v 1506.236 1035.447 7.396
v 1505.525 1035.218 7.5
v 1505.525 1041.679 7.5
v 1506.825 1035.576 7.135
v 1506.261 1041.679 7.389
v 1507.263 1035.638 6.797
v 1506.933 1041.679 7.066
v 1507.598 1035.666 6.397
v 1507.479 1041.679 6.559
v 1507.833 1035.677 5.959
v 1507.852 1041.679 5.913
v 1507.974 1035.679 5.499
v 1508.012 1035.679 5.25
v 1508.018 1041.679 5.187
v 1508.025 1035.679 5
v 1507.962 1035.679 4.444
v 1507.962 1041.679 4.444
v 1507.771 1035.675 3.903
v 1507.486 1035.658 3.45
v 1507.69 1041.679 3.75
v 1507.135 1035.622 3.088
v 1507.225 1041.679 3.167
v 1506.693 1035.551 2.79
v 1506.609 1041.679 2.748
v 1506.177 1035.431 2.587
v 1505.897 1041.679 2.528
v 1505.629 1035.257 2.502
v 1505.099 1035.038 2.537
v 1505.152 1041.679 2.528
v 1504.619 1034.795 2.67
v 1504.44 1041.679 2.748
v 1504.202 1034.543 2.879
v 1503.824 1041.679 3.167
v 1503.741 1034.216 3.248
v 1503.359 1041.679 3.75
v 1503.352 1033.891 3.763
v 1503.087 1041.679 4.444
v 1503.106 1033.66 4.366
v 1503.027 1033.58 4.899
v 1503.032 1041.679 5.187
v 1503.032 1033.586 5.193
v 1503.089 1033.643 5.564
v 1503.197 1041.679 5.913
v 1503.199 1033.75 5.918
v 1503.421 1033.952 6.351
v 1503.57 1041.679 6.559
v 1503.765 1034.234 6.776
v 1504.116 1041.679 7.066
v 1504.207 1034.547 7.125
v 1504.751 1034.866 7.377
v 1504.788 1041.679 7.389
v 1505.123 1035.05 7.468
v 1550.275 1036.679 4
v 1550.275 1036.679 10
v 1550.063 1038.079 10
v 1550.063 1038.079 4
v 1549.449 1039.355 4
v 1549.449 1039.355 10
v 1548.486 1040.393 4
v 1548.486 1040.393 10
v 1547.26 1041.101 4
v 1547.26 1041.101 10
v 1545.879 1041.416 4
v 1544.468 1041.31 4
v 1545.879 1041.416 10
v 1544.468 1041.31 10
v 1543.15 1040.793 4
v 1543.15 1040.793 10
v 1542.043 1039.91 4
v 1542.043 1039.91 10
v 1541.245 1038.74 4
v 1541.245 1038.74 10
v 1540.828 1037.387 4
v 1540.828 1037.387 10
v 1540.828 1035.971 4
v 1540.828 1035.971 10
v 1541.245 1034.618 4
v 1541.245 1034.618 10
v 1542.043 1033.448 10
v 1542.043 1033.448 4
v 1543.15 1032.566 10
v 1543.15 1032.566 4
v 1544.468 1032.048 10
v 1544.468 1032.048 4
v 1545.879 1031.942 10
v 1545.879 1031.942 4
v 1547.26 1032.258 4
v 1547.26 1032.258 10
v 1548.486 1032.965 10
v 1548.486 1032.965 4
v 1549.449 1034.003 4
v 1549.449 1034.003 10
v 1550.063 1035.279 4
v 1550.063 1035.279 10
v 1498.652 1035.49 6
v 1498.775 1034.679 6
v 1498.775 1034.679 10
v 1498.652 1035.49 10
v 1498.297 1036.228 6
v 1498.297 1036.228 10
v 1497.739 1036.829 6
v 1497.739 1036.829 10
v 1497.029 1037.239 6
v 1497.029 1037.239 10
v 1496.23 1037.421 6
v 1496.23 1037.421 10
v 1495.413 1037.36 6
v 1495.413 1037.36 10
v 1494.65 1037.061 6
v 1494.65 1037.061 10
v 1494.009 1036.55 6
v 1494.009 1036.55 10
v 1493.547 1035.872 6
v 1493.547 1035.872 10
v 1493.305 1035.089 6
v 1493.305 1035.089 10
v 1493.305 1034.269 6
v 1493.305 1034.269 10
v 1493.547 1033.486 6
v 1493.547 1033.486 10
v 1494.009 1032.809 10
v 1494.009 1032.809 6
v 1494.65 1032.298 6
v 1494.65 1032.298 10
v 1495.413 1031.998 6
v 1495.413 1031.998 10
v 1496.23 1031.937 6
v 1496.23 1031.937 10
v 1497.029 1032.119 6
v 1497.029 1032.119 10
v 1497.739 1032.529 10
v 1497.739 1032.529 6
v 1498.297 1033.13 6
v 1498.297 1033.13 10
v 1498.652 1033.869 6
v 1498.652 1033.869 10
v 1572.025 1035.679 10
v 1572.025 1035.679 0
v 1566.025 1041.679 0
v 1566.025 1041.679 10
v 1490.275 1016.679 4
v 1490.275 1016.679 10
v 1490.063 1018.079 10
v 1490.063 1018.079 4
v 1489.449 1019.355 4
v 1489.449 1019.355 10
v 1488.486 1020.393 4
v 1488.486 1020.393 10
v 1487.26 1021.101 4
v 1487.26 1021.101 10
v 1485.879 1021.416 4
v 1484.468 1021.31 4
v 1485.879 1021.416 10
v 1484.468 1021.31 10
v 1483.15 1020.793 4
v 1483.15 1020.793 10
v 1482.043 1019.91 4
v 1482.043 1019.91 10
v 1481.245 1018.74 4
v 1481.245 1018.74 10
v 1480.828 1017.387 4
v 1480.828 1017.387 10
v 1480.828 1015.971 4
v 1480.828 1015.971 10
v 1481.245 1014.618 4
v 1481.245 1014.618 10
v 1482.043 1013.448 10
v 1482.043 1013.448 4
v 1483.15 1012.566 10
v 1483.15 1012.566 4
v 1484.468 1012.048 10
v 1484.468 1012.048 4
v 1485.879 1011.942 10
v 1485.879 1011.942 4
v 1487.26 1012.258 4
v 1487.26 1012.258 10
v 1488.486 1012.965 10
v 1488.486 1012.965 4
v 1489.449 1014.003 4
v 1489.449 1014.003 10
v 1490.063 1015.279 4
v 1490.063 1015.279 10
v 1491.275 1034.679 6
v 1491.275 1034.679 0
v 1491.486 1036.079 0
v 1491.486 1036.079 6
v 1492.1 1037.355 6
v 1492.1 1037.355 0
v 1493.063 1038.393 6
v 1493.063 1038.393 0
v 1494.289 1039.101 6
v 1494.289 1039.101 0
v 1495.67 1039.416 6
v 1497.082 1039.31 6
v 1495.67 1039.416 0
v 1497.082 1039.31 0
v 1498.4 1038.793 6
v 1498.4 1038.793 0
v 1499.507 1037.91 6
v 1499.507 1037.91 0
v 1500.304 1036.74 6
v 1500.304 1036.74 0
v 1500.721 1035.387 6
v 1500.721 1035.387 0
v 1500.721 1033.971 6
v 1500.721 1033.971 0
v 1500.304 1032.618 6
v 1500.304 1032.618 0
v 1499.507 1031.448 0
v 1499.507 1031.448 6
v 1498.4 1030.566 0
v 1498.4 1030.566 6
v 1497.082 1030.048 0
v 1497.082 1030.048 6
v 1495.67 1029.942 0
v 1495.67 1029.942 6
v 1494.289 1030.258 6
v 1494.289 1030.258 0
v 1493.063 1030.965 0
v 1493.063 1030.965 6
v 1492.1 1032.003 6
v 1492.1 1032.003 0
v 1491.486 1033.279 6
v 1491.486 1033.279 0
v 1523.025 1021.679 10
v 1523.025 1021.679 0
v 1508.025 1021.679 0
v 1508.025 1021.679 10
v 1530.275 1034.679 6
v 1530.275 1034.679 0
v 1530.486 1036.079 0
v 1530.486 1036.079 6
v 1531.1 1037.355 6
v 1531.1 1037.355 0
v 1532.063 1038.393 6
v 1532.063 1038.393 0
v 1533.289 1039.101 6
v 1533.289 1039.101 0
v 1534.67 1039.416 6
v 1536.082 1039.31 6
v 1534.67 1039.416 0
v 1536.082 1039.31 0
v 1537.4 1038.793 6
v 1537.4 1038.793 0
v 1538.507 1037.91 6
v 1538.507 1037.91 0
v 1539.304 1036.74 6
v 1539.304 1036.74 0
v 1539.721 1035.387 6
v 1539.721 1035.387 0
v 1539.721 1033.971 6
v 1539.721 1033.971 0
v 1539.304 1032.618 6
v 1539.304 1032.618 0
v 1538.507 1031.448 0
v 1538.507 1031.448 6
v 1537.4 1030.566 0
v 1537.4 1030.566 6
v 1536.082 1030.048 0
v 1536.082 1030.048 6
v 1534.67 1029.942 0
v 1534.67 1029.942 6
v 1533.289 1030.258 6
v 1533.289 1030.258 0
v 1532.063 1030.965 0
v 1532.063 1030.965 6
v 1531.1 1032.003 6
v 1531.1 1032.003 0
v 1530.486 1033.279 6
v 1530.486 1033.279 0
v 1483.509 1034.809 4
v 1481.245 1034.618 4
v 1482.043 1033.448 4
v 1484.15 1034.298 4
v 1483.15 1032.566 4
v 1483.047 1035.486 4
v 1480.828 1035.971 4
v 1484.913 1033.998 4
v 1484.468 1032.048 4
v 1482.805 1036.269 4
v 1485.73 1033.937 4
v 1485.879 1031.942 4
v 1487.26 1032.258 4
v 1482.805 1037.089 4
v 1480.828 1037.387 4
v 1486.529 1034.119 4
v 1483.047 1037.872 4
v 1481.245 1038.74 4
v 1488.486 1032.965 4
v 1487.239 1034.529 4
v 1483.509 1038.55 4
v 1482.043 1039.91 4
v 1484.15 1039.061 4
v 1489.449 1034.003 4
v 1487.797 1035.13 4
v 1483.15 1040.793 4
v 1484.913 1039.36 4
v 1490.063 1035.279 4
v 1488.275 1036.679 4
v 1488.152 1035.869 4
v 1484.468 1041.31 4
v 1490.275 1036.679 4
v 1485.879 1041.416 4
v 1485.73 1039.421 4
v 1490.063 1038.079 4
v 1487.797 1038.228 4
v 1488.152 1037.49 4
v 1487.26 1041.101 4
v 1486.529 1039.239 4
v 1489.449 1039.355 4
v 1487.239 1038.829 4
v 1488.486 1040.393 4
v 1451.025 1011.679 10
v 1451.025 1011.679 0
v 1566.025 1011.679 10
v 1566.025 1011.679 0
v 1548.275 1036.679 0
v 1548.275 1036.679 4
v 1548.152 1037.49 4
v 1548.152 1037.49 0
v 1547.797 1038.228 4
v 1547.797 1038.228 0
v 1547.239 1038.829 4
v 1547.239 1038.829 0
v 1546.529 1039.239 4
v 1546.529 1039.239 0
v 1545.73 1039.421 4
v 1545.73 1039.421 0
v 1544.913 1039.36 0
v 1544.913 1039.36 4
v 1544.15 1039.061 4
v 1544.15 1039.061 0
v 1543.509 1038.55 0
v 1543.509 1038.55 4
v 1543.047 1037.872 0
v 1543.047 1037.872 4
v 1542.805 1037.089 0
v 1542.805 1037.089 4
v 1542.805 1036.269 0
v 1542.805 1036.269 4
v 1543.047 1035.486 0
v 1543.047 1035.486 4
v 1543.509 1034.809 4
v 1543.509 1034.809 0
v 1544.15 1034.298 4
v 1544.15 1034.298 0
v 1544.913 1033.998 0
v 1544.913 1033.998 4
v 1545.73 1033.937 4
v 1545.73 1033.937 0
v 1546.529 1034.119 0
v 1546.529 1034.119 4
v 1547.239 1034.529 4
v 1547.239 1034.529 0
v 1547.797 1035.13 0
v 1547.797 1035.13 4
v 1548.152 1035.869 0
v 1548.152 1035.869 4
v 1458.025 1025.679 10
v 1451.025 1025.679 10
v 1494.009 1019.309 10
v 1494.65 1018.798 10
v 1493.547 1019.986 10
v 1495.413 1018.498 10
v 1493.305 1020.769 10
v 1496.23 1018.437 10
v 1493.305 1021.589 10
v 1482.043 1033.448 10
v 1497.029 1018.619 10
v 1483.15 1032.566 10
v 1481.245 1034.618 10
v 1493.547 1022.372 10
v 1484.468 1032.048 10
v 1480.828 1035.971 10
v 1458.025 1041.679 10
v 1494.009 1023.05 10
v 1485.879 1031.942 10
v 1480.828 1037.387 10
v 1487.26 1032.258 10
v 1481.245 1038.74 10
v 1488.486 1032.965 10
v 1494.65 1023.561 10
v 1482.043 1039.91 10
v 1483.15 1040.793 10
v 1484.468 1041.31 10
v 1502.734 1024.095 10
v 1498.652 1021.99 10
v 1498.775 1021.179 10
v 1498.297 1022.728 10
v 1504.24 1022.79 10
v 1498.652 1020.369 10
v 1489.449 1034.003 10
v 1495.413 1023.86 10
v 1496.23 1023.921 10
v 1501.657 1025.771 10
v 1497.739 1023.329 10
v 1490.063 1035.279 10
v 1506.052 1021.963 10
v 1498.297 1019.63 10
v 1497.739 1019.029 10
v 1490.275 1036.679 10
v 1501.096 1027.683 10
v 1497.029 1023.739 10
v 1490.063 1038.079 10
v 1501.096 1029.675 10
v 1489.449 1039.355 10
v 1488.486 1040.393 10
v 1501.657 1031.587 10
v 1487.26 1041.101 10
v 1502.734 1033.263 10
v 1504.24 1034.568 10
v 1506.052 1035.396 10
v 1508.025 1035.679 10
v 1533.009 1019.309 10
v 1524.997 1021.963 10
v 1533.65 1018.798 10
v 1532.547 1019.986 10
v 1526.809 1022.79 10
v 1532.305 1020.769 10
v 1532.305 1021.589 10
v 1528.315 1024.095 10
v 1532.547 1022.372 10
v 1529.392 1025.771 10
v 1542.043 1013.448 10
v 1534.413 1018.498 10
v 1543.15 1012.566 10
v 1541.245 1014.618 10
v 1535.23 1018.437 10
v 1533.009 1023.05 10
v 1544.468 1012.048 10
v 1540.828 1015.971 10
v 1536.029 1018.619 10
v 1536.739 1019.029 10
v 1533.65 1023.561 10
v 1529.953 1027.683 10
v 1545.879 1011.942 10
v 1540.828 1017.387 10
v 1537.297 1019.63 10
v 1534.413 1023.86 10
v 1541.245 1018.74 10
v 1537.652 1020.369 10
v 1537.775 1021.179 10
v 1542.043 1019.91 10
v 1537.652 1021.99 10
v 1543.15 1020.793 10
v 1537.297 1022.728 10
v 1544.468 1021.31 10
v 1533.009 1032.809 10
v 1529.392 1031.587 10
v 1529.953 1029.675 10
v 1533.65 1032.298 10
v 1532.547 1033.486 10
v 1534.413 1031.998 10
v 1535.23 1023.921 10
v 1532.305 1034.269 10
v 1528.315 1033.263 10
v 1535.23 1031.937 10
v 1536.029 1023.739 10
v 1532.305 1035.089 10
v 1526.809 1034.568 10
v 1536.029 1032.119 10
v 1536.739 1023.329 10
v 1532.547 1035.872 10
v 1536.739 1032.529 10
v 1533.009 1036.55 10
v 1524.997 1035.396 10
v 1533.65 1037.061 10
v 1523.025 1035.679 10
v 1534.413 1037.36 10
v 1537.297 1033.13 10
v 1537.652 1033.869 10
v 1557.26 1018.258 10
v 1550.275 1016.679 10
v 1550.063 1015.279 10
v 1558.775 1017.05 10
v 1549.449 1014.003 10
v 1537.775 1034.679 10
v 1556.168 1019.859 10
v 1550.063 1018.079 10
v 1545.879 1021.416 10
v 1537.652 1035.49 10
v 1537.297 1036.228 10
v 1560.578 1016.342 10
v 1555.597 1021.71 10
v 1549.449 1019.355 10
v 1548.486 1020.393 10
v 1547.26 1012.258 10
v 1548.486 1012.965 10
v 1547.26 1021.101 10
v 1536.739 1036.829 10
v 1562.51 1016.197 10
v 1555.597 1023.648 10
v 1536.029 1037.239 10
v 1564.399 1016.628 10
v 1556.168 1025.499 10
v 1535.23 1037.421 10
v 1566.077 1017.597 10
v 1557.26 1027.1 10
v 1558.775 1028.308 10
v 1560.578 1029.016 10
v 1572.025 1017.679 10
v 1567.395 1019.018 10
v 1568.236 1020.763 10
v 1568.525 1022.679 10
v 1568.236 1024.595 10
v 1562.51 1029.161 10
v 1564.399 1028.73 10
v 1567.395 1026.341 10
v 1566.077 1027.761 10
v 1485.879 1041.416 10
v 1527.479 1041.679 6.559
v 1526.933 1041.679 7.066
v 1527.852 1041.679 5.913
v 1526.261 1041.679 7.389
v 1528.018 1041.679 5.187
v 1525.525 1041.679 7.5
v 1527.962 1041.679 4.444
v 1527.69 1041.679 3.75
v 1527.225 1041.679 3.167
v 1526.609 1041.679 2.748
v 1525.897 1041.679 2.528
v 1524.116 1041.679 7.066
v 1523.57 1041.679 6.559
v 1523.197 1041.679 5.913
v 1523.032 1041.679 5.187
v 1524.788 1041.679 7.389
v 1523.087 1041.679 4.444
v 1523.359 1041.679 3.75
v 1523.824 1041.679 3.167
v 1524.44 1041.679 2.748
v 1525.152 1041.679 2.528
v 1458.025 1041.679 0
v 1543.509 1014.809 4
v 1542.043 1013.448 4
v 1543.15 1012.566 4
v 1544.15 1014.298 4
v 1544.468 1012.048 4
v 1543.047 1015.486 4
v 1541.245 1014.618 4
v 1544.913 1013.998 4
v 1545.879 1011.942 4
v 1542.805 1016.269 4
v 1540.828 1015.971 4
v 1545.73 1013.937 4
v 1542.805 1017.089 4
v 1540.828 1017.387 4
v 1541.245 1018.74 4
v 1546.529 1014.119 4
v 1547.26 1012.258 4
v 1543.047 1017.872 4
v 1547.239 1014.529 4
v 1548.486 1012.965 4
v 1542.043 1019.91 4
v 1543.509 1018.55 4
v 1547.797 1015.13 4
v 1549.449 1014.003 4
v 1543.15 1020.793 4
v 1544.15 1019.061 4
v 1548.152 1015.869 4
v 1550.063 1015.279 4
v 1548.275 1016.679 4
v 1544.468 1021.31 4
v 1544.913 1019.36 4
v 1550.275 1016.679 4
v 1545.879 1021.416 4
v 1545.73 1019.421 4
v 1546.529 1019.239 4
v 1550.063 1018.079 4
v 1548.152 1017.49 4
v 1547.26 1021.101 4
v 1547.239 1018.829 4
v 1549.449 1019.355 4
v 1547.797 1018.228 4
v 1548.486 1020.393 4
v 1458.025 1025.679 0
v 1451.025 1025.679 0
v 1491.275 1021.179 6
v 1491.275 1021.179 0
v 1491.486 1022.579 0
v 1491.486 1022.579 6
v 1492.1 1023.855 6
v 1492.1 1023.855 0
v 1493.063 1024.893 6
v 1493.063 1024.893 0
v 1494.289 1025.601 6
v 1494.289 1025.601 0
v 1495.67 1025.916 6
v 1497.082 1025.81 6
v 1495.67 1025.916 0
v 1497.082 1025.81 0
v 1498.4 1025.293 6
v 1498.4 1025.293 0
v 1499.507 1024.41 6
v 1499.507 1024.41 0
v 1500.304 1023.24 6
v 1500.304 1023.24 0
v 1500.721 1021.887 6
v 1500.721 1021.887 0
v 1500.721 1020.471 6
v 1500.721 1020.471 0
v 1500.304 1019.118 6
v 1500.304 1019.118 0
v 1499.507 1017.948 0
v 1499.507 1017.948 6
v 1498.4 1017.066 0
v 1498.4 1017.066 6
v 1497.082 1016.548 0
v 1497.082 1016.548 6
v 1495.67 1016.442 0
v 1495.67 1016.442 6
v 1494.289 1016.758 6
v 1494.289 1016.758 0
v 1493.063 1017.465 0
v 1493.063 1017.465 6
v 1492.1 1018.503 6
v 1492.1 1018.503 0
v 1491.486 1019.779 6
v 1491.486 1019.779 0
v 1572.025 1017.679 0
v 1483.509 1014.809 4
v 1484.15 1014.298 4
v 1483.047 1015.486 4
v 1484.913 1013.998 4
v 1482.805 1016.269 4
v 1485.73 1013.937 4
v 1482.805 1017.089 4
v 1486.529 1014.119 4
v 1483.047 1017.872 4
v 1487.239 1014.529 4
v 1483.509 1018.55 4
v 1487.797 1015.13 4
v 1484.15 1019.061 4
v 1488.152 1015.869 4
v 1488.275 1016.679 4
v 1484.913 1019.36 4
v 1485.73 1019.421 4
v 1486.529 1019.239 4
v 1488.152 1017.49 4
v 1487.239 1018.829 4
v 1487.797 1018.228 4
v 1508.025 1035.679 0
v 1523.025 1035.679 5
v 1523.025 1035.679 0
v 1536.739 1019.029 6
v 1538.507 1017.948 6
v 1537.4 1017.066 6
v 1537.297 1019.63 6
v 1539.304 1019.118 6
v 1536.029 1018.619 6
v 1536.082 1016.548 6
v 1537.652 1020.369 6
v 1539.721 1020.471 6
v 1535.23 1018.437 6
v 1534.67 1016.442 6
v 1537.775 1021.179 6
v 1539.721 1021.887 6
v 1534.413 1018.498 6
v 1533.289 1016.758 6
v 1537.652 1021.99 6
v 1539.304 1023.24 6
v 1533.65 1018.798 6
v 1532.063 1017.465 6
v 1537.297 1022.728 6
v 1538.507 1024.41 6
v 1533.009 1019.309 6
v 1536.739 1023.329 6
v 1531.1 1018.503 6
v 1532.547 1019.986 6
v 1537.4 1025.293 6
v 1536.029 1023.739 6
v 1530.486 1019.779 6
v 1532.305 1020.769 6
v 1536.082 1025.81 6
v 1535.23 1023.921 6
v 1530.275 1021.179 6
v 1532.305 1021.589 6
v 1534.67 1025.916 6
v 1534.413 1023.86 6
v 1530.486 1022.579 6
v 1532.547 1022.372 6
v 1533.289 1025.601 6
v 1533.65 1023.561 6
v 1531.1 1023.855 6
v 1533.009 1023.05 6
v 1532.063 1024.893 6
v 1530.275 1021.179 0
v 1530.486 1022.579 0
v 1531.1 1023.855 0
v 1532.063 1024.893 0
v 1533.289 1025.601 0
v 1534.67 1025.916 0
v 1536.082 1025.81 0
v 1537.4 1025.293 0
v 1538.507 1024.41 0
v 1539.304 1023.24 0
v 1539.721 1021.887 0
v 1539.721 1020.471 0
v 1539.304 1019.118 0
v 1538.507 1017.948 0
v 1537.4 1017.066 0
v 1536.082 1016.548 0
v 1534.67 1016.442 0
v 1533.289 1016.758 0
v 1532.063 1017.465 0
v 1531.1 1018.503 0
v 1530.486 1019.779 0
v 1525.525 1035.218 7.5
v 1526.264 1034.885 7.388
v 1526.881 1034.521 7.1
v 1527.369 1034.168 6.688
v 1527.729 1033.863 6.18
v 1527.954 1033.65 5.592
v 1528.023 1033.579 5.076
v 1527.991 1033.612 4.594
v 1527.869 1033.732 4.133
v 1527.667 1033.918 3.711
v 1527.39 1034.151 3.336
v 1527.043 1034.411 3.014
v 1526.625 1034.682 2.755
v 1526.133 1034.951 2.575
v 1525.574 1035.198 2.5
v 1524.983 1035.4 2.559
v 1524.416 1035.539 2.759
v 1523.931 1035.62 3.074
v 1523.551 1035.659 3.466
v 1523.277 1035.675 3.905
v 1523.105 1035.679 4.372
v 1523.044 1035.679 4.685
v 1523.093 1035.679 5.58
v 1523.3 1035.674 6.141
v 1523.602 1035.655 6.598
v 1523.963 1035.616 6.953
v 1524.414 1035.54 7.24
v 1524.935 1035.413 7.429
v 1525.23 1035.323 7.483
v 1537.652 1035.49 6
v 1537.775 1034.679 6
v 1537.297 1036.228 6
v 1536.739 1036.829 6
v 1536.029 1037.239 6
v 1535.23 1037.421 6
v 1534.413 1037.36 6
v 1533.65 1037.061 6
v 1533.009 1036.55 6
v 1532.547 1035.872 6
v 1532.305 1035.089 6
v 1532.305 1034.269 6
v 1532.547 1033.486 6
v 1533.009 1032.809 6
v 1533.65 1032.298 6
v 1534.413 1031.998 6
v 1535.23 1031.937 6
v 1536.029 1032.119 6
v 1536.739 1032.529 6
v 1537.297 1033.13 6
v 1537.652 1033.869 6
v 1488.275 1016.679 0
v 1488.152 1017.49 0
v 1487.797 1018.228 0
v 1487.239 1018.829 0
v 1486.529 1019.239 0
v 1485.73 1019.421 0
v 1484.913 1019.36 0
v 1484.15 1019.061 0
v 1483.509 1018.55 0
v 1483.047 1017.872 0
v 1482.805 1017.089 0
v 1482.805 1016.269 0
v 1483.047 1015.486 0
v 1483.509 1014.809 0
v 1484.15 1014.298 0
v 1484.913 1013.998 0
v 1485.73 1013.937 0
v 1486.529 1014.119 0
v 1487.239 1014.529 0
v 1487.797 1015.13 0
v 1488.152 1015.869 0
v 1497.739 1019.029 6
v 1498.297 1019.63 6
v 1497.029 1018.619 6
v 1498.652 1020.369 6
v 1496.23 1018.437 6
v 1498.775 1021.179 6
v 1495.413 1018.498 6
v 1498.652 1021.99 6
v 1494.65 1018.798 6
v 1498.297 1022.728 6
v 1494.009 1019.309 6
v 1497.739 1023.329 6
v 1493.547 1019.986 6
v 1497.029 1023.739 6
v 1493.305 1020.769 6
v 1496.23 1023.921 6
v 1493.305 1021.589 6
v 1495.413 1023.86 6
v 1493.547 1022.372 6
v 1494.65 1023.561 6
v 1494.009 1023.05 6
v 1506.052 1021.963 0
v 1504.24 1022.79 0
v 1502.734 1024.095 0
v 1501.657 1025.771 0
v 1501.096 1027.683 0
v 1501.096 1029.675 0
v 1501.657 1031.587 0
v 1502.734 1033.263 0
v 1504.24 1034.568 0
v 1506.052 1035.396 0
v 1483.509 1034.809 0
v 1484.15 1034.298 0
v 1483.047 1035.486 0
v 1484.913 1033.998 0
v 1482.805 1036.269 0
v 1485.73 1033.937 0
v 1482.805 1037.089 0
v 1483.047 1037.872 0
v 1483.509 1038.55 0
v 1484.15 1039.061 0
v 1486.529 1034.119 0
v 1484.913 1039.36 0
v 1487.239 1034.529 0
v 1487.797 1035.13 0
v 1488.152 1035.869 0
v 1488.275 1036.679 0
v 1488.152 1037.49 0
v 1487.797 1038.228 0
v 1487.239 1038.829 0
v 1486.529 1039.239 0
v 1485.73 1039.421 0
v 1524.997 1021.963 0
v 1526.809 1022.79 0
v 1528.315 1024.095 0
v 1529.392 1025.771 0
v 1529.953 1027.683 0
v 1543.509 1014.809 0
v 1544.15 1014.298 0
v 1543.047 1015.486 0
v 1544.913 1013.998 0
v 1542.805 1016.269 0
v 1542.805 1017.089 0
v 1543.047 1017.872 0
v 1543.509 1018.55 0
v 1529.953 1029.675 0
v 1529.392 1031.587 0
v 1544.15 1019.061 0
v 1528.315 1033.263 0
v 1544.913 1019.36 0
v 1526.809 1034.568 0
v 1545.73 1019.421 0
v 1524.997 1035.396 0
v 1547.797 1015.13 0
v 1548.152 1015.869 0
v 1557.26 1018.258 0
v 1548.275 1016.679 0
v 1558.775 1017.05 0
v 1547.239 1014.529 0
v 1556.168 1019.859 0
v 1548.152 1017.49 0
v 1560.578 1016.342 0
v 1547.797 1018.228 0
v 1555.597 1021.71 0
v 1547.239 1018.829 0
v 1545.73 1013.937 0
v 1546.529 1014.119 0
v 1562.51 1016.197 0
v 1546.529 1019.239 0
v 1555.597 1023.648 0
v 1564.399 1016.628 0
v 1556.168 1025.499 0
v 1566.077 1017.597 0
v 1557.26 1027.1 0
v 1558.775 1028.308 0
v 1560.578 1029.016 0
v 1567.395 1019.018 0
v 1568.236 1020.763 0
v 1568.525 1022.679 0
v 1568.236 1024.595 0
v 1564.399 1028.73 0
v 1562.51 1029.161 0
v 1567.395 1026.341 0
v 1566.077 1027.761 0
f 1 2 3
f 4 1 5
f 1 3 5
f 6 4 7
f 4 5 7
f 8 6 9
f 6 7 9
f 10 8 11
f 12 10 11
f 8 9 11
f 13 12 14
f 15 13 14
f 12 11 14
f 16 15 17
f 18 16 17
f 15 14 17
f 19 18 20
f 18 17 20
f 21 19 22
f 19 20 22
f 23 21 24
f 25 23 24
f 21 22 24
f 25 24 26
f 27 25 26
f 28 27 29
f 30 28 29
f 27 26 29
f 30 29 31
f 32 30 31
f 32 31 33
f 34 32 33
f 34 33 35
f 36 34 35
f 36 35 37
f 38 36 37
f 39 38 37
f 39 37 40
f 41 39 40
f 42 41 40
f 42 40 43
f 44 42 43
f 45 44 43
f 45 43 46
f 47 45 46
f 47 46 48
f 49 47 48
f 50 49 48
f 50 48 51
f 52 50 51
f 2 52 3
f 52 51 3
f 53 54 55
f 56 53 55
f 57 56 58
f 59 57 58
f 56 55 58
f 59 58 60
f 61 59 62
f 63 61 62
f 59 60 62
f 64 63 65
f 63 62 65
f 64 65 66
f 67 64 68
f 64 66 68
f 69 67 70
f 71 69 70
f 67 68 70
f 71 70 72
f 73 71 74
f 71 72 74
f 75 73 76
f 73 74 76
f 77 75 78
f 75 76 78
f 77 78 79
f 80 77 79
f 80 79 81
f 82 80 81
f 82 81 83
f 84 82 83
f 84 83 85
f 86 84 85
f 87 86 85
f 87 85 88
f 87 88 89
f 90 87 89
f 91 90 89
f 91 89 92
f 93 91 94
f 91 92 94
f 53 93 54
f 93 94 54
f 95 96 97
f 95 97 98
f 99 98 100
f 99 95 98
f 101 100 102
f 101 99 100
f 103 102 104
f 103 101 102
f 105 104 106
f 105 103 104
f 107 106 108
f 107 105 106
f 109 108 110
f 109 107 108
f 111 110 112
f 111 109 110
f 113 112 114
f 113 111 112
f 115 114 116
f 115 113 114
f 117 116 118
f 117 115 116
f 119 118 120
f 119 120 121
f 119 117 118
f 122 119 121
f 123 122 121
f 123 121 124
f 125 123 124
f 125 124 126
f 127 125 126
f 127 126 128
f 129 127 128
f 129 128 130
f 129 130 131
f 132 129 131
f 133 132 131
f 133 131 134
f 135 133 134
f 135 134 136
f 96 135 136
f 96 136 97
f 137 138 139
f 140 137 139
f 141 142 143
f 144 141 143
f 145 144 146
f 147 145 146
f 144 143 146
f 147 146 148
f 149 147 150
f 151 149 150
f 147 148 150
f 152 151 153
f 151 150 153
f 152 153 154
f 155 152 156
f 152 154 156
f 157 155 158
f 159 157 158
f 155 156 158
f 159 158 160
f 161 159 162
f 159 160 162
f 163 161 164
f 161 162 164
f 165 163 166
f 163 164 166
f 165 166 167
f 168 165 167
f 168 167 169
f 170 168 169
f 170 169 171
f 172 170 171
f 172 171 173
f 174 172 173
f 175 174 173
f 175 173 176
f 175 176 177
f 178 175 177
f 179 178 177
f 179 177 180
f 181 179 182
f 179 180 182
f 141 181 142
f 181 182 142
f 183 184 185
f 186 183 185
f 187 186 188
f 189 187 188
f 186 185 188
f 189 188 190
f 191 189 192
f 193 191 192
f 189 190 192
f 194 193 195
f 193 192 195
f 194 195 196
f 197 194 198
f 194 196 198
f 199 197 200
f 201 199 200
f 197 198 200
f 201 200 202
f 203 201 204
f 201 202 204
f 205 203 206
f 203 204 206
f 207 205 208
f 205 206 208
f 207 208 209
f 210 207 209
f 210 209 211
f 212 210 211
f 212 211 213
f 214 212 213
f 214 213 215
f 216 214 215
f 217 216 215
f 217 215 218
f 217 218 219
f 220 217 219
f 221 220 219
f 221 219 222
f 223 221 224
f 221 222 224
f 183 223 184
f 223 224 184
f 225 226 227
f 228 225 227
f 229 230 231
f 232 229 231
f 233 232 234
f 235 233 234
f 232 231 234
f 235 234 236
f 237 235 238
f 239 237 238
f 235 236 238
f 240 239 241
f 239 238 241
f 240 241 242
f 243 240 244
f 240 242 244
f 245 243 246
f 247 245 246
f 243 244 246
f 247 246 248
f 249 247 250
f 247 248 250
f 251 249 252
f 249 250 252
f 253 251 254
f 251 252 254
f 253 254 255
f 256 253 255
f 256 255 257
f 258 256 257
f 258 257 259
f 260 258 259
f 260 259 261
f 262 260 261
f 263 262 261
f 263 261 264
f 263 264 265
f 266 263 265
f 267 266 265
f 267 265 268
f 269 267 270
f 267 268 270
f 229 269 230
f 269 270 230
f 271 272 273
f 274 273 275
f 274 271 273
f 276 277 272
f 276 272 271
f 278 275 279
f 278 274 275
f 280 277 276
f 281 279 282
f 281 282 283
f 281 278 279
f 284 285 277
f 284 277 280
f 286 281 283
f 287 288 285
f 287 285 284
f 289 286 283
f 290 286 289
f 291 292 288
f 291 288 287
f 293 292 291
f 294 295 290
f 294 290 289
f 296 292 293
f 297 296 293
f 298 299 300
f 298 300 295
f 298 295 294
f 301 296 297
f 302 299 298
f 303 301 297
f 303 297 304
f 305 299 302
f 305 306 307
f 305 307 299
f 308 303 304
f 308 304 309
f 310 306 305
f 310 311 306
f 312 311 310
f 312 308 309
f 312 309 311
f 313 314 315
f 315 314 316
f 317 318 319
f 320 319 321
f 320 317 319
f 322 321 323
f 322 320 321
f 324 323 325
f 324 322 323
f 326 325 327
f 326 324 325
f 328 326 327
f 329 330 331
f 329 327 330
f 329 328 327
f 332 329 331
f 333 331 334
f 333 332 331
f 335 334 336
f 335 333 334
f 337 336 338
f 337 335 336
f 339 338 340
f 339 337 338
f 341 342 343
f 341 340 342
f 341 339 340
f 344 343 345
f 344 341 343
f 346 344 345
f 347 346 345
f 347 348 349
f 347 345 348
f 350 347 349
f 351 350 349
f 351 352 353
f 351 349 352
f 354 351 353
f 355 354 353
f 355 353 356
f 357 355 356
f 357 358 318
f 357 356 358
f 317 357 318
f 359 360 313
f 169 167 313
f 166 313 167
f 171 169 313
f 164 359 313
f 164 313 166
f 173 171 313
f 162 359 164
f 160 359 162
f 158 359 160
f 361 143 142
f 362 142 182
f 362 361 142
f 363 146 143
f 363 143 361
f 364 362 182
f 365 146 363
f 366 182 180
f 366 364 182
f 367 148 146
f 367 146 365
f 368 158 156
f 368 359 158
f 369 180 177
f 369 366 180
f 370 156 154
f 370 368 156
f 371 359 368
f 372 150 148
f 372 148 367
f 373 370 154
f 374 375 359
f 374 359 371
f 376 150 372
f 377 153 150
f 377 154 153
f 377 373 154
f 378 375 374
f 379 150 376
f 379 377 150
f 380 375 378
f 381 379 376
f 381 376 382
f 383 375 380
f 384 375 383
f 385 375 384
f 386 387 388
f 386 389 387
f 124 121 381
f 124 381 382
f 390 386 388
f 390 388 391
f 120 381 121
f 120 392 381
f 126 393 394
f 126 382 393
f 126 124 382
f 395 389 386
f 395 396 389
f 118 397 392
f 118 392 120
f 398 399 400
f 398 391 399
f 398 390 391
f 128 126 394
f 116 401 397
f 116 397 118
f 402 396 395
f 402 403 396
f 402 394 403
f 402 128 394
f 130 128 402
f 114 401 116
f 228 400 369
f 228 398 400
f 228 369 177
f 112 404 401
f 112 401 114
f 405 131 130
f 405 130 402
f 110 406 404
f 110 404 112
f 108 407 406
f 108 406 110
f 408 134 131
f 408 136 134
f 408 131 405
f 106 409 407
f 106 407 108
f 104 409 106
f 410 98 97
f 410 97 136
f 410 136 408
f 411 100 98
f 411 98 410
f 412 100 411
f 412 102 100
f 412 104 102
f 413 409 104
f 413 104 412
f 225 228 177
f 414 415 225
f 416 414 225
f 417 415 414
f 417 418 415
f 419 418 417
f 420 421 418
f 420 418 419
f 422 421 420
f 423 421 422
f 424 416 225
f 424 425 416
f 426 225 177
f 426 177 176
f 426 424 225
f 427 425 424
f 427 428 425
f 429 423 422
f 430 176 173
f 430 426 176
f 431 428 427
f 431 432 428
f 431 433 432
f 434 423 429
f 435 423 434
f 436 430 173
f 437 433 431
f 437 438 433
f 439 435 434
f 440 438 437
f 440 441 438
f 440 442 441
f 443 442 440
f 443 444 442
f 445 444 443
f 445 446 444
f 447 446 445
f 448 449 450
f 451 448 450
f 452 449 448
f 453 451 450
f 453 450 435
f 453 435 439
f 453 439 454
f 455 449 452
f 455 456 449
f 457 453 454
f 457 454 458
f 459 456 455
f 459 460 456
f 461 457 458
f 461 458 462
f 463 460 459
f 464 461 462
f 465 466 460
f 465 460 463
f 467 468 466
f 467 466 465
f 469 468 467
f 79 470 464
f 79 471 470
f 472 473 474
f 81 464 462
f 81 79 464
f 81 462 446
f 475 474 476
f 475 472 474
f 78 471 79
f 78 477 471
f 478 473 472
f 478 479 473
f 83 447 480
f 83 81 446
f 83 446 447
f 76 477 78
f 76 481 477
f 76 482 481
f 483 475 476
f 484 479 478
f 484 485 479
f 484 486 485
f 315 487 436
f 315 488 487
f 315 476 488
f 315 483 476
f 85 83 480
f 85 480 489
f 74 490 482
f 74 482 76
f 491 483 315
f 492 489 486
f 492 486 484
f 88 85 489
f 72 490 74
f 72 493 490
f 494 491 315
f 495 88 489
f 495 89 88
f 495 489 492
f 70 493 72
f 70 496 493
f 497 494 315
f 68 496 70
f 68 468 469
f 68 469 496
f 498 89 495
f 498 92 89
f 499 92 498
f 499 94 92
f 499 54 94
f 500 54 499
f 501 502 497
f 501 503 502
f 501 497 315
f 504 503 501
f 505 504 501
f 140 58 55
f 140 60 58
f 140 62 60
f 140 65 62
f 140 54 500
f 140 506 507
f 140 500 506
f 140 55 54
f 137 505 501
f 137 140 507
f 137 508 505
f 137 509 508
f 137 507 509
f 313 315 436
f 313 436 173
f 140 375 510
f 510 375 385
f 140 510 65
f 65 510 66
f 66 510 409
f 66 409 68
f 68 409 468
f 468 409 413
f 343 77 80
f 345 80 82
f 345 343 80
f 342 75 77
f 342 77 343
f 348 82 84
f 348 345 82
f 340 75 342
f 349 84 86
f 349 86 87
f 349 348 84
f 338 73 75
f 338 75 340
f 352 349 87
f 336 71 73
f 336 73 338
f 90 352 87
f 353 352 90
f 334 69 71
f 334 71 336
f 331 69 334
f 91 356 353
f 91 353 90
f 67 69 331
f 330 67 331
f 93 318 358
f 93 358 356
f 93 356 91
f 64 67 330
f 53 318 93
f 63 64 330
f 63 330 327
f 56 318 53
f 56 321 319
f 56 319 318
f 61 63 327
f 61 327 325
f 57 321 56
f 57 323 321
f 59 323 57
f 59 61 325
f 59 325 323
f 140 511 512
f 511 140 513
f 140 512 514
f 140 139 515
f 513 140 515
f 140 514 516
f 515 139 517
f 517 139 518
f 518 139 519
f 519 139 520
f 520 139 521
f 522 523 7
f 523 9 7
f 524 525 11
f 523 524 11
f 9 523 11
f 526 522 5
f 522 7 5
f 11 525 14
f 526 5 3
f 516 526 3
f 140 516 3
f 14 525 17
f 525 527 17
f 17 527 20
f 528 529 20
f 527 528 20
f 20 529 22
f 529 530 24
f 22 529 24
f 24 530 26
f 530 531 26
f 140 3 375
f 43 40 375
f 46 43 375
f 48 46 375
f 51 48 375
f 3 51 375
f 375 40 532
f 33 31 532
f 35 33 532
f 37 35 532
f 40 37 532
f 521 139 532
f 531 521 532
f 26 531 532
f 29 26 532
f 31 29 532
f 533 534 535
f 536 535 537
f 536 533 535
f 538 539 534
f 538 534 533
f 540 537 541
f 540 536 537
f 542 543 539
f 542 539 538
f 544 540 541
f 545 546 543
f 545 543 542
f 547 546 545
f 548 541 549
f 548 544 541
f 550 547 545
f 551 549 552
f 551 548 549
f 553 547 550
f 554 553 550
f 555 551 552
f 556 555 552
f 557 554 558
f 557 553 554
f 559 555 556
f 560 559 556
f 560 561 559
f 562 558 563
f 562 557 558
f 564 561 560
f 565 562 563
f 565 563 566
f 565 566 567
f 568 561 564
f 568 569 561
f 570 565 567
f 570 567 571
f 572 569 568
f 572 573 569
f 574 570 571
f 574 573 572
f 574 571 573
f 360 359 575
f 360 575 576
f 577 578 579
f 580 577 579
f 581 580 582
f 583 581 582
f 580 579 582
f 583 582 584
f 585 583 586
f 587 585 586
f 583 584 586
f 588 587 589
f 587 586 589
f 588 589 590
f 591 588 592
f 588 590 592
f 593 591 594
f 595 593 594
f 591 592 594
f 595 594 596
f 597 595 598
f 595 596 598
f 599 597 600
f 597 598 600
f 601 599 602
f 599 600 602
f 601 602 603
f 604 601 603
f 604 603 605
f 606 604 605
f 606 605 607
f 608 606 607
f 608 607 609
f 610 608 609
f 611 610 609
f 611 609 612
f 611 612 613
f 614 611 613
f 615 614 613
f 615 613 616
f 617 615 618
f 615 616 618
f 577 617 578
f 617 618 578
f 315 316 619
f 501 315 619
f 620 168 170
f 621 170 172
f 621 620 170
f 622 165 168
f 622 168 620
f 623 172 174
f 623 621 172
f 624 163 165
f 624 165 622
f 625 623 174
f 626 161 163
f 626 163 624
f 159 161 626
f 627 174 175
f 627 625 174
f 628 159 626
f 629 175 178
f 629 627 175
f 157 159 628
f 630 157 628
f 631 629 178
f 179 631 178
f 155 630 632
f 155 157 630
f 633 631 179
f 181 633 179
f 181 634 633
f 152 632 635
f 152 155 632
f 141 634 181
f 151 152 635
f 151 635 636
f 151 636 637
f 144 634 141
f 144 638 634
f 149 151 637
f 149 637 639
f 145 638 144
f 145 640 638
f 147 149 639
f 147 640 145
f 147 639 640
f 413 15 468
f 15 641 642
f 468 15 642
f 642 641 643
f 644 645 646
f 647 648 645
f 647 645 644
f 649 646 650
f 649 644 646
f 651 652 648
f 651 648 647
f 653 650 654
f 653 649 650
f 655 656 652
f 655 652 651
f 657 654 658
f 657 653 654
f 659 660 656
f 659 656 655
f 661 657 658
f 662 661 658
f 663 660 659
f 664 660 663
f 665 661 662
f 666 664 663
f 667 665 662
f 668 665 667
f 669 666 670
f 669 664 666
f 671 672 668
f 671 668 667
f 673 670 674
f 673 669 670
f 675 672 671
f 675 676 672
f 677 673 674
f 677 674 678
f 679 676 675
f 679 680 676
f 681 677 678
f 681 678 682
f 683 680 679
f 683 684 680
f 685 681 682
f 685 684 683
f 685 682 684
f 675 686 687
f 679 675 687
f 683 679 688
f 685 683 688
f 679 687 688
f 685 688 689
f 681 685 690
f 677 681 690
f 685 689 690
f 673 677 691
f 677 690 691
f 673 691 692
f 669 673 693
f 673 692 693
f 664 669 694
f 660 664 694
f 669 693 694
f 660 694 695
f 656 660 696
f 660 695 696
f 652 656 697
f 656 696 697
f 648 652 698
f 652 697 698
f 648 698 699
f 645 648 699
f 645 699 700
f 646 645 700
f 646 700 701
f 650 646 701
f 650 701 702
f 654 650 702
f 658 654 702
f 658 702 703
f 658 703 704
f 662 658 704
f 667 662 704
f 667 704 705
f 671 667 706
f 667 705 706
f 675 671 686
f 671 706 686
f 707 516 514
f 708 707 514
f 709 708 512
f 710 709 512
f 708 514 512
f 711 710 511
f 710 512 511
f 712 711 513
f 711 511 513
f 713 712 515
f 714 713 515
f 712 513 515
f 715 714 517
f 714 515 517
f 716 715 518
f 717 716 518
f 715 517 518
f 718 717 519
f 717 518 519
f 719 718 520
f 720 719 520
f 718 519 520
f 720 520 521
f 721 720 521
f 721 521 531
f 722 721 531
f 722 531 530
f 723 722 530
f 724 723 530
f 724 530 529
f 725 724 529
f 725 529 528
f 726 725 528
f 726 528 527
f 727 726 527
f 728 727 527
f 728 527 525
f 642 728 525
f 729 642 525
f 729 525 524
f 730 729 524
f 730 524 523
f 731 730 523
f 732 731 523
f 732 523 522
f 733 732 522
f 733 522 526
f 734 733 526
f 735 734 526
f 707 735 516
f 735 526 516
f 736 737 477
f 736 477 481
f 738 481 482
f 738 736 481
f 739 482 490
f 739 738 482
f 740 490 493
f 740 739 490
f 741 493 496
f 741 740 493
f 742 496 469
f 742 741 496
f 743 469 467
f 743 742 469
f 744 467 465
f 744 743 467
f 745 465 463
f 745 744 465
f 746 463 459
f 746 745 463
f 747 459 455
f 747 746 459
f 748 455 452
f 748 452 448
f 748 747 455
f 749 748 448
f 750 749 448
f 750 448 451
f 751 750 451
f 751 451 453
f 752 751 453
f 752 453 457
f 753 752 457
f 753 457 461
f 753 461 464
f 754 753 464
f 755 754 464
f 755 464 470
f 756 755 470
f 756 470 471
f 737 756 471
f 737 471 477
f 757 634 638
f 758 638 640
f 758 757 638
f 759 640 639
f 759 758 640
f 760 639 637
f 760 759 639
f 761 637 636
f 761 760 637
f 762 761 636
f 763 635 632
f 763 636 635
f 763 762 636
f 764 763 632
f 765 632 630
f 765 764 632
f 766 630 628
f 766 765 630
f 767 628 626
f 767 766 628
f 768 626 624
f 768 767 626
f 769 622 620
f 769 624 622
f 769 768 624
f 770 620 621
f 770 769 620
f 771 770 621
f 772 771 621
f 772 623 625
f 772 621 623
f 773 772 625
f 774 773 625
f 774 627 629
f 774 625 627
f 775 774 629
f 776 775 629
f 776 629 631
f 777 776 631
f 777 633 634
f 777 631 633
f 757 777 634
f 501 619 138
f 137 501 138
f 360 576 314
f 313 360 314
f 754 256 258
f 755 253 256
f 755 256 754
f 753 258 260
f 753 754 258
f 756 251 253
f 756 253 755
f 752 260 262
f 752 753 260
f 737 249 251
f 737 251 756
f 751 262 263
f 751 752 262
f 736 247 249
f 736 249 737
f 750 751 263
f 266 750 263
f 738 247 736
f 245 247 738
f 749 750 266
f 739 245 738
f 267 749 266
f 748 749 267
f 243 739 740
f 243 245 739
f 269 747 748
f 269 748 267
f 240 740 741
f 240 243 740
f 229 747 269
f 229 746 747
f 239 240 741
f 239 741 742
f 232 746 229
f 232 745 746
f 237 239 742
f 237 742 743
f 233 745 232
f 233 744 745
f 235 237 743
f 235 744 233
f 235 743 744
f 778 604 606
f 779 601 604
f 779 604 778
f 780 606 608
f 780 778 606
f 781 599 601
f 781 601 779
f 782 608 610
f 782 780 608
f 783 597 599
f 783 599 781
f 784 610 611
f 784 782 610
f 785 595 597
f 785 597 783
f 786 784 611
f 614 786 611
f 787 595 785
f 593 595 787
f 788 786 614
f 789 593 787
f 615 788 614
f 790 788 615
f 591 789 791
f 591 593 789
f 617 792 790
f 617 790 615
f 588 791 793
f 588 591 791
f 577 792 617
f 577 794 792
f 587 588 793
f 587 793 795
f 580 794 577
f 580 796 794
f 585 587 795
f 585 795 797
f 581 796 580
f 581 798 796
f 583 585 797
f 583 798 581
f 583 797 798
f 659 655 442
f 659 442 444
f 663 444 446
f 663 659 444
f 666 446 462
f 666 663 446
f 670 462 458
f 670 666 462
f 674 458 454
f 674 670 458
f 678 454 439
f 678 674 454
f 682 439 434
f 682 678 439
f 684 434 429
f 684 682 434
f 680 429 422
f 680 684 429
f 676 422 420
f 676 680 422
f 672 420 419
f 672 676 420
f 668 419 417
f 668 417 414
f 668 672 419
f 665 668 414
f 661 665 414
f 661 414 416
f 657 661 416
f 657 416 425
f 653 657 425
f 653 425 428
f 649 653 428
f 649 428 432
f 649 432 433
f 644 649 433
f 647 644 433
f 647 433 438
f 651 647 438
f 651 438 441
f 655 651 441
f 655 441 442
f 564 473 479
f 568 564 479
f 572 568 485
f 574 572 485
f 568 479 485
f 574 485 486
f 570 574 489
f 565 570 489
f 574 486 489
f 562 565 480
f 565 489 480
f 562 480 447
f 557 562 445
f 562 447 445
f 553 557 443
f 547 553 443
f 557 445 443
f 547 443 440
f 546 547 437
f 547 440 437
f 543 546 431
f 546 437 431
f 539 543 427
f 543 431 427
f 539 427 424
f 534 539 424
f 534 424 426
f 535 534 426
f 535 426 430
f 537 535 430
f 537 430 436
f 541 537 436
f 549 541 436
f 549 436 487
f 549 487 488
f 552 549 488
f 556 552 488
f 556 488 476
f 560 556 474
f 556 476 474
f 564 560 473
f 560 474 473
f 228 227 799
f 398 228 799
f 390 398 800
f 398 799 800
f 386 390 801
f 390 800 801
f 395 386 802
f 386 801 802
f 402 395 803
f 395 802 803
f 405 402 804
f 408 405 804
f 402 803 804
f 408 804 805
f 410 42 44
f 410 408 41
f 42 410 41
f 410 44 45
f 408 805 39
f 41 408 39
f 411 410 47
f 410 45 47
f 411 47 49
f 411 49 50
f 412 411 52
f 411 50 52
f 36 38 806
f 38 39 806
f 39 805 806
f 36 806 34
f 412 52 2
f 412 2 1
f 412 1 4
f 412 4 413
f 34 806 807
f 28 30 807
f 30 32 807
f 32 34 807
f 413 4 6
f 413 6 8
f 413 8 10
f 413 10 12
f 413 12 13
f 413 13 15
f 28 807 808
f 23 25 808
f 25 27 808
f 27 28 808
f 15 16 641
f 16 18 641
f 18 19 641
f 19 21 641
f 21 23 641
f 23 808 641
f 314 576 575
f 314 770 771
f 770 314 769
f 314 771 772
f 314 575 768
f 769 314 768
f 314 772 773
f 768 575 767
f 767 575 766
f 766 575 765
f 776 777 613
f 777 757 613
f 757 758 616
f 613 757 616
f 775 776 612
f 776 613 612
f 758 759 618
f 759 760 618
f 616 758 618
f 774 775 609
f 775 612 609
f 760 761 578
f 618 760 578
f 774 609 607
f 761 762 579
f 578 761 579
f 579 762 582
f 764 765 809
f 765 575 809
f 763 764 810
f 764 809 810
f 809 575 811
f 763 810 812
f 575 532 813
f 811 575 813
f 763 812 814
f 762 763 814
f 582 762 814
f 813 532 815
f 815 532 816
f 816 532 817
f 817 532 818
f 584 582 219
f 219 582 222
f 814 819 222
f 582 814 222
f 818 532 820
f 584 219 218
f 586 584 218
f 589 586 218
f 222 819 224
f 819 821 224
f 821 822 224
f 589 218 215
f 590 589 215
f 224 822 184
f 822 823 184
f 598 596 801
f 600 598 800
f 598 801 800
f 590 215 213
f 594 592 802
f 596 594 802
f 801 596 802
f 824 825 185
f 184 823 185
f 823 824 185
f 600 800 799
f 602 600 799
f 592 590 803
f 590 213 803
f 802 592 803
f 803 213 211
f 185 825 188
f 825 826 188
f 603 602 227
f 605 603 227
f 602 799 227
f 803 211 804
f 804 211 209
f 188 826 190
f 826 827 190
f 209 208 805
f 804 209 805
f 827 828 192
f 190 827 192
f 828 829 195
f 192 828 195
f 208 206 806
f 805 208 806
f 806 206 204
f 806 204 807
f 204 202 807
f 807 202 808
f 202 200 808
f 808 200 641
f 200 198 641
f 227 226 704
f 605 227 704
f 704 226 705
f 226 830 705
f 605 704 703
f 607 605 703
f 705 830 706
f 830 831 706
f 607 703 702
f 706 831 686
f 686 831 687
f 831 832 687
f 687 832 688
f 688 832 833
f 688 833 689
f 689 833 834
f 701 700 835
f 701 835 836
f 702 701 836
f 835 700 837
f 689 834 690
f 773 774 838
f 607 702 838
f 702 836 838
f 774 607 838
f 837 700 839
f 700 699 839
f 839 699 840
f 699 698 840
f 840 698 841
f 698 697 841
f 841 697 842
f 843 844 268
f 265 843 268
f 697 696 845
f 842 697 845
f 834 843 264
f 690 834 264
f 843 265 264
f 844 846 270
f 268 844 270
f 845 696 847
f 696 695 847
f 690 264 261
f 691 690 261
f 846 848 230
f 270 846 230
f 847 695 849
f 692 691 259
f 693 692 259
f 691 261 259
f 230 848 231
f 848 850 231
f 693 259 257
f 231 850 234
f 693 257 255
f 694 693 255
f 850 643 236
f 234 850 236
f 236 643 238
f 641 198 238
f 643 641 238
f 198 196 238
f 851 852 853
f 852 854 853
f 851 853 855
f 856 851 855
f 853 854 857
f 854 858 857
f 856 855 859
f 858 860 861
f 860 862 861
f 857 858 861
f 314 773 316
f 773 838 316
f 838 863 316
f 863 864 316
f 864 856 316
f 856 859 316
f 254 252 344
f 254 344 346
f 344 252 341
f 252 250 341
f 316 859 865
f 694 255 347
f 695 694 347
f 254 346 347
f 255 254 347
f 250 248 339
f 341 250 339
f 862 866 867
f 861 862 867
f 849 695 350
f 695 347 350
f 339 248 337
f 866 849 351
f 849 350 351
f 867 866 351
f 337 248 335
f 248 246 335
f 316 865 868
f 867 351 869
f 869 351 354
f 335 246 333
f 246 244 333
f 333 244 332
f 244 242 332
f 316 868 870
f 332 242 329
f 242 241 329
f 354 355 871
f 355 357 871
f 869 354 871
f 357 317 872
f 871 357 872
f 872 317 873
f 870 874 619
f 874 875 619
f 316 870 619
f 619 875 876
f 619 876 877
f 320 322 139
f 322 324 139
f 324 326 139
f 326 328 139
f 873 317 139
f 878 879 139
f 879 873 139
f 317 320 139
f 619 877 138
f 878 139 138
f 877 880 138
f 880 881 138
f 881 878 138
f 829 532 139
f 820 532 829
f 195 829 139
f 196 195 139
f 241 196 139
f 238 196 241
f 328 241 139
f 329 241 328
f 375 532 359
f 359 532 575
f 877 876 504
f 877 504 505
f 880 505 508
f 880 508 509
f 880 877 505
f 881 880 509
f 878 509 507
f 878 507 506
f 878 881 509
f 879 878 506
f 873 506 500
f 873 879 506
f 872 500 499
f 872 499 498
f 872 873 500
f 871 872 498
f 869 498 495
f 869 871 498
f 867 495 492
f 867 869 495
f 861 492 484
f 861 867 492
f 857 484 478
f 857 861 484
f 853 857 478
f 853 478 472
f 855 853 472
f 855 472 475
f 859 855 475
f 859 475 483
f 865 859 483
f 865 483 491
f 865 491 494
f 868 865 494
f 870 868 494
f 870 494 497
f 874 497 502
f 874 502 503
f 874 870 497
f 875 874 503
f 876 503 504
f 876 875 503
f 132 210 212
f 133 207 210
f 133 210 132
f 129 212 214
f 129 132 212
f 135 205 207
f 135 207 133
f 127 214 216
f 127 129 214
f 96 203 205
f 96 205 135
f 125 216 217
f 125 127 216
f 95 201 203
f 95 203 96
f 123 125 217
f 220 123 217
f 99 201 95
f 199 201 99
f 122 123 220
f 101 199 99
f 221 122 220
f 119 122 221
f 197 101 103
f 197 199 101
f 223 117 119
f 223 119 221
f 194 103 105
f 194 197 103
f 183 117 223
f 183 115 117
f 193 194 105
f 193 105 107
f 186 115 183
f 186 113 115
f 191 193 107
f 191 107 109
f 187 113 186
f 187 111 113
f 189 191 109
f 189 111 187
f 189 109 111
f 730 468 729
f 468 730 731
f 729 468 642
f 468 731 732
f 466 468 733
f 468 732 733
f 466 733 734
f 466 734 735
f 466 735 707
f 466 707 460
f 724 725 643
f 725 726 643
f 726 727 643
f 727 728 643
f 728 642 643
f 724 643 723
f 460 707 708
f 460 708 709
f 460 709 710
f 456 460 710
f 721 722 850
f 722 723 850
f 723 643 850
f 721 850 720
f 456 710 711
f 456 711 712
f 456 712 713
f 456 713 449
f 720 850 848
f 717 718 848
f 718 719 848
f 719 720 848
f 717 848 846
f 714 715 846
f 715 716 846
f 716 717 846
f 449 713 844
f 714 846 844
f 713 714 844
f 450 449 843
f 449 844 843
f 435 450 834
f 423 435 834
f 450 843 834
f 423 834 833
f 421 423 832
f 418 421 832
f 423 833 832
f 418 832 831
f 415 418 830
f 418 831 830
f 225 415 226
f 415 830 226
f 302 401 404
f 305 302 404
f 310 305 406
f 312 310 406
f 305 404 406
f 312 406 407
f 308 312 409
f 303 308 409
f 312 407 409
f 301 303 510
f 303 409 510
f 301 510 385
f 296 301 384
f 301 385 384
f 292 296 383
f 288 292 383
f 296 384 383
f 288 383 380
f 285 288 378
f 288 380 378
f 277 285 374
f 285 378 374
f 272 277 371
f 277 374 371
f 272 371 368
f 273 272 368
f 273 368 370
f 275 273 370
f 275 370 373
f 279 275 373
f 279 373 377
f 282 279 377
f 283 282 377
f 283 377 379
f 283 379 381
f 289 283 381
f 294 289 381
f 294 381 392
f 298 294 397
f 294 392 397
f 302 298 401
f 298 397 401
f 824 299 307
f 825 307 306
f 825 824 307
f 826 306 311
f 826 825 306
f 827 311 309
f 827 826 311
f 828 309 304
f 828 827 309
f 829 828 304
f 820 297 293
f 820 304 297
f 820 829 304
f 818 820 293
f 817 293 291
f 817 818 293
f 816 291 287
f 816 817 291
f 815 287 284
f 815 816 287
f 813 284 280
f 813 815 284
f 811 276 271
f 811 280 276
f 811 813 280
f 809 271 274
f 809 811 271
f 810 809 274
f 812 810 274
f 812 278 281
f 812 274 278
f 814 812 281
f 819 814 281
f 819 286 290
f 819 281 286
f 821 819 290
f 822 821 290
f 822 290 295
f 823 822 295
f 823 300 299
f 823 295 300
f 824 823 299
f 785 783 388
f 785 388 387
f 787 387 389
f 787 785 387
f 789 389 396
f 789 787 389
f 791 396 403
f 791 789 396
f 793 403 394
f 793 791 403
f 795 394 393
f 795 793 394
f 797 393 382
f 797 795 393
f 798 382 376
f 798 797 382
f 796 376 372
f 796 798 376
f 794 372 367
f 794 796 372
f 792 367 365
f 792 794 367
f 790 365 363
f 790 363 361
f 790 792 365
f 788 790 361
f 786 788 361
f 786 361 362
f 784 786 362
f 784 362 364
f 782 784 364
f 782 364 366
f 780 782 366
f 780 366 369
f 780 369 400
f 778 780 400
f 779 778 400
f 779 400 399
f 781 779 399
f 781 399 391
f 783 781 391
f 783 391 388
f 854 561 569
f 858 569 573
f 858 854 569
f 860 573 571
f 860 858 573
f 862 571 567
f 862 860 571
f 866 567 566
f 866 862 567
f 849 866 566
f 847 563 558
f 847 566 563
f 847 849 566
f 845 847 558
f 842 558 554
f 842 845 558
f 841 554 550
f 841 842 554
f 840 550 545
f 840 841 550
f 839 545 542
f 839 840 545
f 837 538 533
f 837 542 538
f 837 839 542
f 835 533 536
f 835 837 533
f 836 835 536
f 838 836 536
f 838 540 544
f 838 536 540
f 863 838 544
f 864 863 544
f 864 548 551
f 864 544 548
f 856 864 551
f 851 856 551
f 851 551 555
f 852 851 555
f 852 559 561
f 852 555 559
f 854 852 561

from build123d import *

# Parameters (mm, degrees)
SKETCH_1_R          = 2.75
SKETCH_1_R_2        = 6.5
EXTRUDE_1_DEPTH     = 10
SKETCH_2_R          = 4.75
CUT_EXTRUDE_2_DEPTH = 6
SKETCH_3_R          = 4.75
CUT_EXTRUDE_3_DEPTH = 6
CUT_EXTRUDE_4_REACH = 1574.343
SKETCH_4_R          = 2.5


with BuildPart() as part:
    # 草图1 → 拉伸1 (new body)
    with BuildSketch(Plane.XY):
        Polygon((1458.024528538, 1041.679154631), (1458.024528538, 1025.679154631), (1451.024528538, 1025.679154631), (1451.024528538, 1011.679154631), (1566.024528538, 1011.679154631), (1572.024528538, 1017.679154631), (1572.024528538, 1035.679154631), (1566.024528538, 1041.679154631), align=None)
        with Locations((1545.524528538, 1016.679154631)):
            Circle(SKETCH_1_R, mode=Mode.SUBTRACT)
        with Locations((1485.524528538, 1016.679154631)):
            Circle(SKETCH_1_R, mode=Mode.SUBTRACT)
        with Locations((1485.524528538, 1036.679154631)):
            Circle(SKETCH_1_R, mode=Mode.SUBTRACT)
        with Locations((1545.524528538, 1036.679154631)):
            Circle(SKETCH_1_R, mode=Mode.SUBTRACT)
        with Locations((1496.024528538, 1021.179154631)):
            Circle(SKETCH_1_R, mode=Mode.SUBTRACT)
        with Locations((1535.024528538, 1021.179154631)):
            Circle(SKETCH_1_R, mode=Mode.SUBTRACT)
        with Locations((1535.024528538, 1034.679154631)):
            Circle(SKETCH_1_R, mode=Mode.SUBTRACT)
        with Locations((1496.024528538, 1034.679154631)):
            Circle(SKETCH_1_R, mode=Mode.SUBTRACT)
        with Locations((1562.024528538, 1022.679154631)):
            Circle(SKETCH_1_R_2, mode=Mode.SUBTRACT)
        with BuildLine():
            Line((1508.024528538, 1035.679154631), (1523.024528538, 1035.679154631))
            ThreePointArc((1523.024528538, 1035.679154631), (1530.024528538, 1028.679154631), (1523.024528538, 1021.679154631))
            Line((1523.024528538, 1021.679154631), (1508.024528538, 1021.679154631))
            ThreePointArc((1508.024528538, 1021.679154631), (1501.024528538, 1028.679154631), (1508.024528538, 1035.679154631))
        make_face(mode=Mode.SUBTRACT)
    extrude(amount=EXTRUDE_1_DEPTH)

    # 草图2 → 拉伸2 (cut)
    with BuildSketch(Plane.XY.offset(10)):
        with Locations((1485.524528538, 1036.679154631)):
            Circle(SKETCH_2_R)
        with Locations((1545.524528538, 1036.679154631)):
            Circle(SKETCH_2_R)
        with Locations((1485.524528538, 1016.679154631)):
            Circle(SKETCH_2_R)
        with Locations((1545.524528538, 1016.679154631)):
            Circle(SKETCH_2_R)
    extrude(amount=-CUT_EXTRUDE_2_DEPTH, mode=Mode.SUBTRACT)

    # 草图3 → 拉伸3 (cut)
    with BuildSketch(Plane(origin=(0, 0, 0), x_dir=(-1, 0, 0), z_dir=(0, 0, -1))):
        with Locations((-1535.024528538, 1034.679154631)):
            Circle(SKETCH_3_R)
        with Locations((-1496.024528538, 1034.679154631)):
            Circle(SKETCH_3_R)
        with Locations((-1535.024528538, 1021.179154631)):
            Circle(SKETCH_3_R)
        with Locations((-1496.024528538, 1021.179154631)):
            Circle(SKETCH_3_R)
    extrude(amount=-CUT_EXTRUDE_3_DEPTH, mode=Mode.SUBTRACT)

    # 草图4 → 拉伸4 (cut, up to next)
    with BuildSketch(Plane(origin=(0, 1041.679154631, 0), x_dir=(1, 0, 0), z_dir=(0, 1, 0)), mode=Mode.PRIVATE) as cut_extrude_4_sk1:
        with Locations(Location((1505.524528538, -5, 0), (0, 0, 270))):
            Circle(SKETCH_4_R)
    cut_extrude_4_tool1 = extrude(cut_extrude_4_sk1.sketch, amount=-CUT_EXTRUDE_4_REACH, mode=Mode.PRIVATE) & part.part
    # 草图4 → 拉伸4 (cut, up to next)
    with BuildSketch(Plane(origin=(0, 1041.679154631, 0), x_dir=(1, 0, 0), z_dir=(0, 1, 0)), mode=Mode.PRIVATE) as cut_extrude_4_sk2:
        with Locations(Location((1525.524528538, -5, 0), (0, 0, 270))):
            Circle(SKETCH_4_R)
    cut_extrude_4_tool2 = extrude(cut_extrude_4_sk2.sketch, amount=-CUT_EXTRUDE_4_REACH, mode=Mode.PRIVATE) & part.part
    add(cut_extrude_4_tool1.solids().sort_by_distance((1505.524529, 1041.679155, 5))[0], mode=Mode.SUBTRACT)
    add(cut_extrude_4_tool2.solids().sort_by_distance((1525.524529, 1041.679155, 5))[0], mode=Mode.SUBTRACT)


solid = part.part
